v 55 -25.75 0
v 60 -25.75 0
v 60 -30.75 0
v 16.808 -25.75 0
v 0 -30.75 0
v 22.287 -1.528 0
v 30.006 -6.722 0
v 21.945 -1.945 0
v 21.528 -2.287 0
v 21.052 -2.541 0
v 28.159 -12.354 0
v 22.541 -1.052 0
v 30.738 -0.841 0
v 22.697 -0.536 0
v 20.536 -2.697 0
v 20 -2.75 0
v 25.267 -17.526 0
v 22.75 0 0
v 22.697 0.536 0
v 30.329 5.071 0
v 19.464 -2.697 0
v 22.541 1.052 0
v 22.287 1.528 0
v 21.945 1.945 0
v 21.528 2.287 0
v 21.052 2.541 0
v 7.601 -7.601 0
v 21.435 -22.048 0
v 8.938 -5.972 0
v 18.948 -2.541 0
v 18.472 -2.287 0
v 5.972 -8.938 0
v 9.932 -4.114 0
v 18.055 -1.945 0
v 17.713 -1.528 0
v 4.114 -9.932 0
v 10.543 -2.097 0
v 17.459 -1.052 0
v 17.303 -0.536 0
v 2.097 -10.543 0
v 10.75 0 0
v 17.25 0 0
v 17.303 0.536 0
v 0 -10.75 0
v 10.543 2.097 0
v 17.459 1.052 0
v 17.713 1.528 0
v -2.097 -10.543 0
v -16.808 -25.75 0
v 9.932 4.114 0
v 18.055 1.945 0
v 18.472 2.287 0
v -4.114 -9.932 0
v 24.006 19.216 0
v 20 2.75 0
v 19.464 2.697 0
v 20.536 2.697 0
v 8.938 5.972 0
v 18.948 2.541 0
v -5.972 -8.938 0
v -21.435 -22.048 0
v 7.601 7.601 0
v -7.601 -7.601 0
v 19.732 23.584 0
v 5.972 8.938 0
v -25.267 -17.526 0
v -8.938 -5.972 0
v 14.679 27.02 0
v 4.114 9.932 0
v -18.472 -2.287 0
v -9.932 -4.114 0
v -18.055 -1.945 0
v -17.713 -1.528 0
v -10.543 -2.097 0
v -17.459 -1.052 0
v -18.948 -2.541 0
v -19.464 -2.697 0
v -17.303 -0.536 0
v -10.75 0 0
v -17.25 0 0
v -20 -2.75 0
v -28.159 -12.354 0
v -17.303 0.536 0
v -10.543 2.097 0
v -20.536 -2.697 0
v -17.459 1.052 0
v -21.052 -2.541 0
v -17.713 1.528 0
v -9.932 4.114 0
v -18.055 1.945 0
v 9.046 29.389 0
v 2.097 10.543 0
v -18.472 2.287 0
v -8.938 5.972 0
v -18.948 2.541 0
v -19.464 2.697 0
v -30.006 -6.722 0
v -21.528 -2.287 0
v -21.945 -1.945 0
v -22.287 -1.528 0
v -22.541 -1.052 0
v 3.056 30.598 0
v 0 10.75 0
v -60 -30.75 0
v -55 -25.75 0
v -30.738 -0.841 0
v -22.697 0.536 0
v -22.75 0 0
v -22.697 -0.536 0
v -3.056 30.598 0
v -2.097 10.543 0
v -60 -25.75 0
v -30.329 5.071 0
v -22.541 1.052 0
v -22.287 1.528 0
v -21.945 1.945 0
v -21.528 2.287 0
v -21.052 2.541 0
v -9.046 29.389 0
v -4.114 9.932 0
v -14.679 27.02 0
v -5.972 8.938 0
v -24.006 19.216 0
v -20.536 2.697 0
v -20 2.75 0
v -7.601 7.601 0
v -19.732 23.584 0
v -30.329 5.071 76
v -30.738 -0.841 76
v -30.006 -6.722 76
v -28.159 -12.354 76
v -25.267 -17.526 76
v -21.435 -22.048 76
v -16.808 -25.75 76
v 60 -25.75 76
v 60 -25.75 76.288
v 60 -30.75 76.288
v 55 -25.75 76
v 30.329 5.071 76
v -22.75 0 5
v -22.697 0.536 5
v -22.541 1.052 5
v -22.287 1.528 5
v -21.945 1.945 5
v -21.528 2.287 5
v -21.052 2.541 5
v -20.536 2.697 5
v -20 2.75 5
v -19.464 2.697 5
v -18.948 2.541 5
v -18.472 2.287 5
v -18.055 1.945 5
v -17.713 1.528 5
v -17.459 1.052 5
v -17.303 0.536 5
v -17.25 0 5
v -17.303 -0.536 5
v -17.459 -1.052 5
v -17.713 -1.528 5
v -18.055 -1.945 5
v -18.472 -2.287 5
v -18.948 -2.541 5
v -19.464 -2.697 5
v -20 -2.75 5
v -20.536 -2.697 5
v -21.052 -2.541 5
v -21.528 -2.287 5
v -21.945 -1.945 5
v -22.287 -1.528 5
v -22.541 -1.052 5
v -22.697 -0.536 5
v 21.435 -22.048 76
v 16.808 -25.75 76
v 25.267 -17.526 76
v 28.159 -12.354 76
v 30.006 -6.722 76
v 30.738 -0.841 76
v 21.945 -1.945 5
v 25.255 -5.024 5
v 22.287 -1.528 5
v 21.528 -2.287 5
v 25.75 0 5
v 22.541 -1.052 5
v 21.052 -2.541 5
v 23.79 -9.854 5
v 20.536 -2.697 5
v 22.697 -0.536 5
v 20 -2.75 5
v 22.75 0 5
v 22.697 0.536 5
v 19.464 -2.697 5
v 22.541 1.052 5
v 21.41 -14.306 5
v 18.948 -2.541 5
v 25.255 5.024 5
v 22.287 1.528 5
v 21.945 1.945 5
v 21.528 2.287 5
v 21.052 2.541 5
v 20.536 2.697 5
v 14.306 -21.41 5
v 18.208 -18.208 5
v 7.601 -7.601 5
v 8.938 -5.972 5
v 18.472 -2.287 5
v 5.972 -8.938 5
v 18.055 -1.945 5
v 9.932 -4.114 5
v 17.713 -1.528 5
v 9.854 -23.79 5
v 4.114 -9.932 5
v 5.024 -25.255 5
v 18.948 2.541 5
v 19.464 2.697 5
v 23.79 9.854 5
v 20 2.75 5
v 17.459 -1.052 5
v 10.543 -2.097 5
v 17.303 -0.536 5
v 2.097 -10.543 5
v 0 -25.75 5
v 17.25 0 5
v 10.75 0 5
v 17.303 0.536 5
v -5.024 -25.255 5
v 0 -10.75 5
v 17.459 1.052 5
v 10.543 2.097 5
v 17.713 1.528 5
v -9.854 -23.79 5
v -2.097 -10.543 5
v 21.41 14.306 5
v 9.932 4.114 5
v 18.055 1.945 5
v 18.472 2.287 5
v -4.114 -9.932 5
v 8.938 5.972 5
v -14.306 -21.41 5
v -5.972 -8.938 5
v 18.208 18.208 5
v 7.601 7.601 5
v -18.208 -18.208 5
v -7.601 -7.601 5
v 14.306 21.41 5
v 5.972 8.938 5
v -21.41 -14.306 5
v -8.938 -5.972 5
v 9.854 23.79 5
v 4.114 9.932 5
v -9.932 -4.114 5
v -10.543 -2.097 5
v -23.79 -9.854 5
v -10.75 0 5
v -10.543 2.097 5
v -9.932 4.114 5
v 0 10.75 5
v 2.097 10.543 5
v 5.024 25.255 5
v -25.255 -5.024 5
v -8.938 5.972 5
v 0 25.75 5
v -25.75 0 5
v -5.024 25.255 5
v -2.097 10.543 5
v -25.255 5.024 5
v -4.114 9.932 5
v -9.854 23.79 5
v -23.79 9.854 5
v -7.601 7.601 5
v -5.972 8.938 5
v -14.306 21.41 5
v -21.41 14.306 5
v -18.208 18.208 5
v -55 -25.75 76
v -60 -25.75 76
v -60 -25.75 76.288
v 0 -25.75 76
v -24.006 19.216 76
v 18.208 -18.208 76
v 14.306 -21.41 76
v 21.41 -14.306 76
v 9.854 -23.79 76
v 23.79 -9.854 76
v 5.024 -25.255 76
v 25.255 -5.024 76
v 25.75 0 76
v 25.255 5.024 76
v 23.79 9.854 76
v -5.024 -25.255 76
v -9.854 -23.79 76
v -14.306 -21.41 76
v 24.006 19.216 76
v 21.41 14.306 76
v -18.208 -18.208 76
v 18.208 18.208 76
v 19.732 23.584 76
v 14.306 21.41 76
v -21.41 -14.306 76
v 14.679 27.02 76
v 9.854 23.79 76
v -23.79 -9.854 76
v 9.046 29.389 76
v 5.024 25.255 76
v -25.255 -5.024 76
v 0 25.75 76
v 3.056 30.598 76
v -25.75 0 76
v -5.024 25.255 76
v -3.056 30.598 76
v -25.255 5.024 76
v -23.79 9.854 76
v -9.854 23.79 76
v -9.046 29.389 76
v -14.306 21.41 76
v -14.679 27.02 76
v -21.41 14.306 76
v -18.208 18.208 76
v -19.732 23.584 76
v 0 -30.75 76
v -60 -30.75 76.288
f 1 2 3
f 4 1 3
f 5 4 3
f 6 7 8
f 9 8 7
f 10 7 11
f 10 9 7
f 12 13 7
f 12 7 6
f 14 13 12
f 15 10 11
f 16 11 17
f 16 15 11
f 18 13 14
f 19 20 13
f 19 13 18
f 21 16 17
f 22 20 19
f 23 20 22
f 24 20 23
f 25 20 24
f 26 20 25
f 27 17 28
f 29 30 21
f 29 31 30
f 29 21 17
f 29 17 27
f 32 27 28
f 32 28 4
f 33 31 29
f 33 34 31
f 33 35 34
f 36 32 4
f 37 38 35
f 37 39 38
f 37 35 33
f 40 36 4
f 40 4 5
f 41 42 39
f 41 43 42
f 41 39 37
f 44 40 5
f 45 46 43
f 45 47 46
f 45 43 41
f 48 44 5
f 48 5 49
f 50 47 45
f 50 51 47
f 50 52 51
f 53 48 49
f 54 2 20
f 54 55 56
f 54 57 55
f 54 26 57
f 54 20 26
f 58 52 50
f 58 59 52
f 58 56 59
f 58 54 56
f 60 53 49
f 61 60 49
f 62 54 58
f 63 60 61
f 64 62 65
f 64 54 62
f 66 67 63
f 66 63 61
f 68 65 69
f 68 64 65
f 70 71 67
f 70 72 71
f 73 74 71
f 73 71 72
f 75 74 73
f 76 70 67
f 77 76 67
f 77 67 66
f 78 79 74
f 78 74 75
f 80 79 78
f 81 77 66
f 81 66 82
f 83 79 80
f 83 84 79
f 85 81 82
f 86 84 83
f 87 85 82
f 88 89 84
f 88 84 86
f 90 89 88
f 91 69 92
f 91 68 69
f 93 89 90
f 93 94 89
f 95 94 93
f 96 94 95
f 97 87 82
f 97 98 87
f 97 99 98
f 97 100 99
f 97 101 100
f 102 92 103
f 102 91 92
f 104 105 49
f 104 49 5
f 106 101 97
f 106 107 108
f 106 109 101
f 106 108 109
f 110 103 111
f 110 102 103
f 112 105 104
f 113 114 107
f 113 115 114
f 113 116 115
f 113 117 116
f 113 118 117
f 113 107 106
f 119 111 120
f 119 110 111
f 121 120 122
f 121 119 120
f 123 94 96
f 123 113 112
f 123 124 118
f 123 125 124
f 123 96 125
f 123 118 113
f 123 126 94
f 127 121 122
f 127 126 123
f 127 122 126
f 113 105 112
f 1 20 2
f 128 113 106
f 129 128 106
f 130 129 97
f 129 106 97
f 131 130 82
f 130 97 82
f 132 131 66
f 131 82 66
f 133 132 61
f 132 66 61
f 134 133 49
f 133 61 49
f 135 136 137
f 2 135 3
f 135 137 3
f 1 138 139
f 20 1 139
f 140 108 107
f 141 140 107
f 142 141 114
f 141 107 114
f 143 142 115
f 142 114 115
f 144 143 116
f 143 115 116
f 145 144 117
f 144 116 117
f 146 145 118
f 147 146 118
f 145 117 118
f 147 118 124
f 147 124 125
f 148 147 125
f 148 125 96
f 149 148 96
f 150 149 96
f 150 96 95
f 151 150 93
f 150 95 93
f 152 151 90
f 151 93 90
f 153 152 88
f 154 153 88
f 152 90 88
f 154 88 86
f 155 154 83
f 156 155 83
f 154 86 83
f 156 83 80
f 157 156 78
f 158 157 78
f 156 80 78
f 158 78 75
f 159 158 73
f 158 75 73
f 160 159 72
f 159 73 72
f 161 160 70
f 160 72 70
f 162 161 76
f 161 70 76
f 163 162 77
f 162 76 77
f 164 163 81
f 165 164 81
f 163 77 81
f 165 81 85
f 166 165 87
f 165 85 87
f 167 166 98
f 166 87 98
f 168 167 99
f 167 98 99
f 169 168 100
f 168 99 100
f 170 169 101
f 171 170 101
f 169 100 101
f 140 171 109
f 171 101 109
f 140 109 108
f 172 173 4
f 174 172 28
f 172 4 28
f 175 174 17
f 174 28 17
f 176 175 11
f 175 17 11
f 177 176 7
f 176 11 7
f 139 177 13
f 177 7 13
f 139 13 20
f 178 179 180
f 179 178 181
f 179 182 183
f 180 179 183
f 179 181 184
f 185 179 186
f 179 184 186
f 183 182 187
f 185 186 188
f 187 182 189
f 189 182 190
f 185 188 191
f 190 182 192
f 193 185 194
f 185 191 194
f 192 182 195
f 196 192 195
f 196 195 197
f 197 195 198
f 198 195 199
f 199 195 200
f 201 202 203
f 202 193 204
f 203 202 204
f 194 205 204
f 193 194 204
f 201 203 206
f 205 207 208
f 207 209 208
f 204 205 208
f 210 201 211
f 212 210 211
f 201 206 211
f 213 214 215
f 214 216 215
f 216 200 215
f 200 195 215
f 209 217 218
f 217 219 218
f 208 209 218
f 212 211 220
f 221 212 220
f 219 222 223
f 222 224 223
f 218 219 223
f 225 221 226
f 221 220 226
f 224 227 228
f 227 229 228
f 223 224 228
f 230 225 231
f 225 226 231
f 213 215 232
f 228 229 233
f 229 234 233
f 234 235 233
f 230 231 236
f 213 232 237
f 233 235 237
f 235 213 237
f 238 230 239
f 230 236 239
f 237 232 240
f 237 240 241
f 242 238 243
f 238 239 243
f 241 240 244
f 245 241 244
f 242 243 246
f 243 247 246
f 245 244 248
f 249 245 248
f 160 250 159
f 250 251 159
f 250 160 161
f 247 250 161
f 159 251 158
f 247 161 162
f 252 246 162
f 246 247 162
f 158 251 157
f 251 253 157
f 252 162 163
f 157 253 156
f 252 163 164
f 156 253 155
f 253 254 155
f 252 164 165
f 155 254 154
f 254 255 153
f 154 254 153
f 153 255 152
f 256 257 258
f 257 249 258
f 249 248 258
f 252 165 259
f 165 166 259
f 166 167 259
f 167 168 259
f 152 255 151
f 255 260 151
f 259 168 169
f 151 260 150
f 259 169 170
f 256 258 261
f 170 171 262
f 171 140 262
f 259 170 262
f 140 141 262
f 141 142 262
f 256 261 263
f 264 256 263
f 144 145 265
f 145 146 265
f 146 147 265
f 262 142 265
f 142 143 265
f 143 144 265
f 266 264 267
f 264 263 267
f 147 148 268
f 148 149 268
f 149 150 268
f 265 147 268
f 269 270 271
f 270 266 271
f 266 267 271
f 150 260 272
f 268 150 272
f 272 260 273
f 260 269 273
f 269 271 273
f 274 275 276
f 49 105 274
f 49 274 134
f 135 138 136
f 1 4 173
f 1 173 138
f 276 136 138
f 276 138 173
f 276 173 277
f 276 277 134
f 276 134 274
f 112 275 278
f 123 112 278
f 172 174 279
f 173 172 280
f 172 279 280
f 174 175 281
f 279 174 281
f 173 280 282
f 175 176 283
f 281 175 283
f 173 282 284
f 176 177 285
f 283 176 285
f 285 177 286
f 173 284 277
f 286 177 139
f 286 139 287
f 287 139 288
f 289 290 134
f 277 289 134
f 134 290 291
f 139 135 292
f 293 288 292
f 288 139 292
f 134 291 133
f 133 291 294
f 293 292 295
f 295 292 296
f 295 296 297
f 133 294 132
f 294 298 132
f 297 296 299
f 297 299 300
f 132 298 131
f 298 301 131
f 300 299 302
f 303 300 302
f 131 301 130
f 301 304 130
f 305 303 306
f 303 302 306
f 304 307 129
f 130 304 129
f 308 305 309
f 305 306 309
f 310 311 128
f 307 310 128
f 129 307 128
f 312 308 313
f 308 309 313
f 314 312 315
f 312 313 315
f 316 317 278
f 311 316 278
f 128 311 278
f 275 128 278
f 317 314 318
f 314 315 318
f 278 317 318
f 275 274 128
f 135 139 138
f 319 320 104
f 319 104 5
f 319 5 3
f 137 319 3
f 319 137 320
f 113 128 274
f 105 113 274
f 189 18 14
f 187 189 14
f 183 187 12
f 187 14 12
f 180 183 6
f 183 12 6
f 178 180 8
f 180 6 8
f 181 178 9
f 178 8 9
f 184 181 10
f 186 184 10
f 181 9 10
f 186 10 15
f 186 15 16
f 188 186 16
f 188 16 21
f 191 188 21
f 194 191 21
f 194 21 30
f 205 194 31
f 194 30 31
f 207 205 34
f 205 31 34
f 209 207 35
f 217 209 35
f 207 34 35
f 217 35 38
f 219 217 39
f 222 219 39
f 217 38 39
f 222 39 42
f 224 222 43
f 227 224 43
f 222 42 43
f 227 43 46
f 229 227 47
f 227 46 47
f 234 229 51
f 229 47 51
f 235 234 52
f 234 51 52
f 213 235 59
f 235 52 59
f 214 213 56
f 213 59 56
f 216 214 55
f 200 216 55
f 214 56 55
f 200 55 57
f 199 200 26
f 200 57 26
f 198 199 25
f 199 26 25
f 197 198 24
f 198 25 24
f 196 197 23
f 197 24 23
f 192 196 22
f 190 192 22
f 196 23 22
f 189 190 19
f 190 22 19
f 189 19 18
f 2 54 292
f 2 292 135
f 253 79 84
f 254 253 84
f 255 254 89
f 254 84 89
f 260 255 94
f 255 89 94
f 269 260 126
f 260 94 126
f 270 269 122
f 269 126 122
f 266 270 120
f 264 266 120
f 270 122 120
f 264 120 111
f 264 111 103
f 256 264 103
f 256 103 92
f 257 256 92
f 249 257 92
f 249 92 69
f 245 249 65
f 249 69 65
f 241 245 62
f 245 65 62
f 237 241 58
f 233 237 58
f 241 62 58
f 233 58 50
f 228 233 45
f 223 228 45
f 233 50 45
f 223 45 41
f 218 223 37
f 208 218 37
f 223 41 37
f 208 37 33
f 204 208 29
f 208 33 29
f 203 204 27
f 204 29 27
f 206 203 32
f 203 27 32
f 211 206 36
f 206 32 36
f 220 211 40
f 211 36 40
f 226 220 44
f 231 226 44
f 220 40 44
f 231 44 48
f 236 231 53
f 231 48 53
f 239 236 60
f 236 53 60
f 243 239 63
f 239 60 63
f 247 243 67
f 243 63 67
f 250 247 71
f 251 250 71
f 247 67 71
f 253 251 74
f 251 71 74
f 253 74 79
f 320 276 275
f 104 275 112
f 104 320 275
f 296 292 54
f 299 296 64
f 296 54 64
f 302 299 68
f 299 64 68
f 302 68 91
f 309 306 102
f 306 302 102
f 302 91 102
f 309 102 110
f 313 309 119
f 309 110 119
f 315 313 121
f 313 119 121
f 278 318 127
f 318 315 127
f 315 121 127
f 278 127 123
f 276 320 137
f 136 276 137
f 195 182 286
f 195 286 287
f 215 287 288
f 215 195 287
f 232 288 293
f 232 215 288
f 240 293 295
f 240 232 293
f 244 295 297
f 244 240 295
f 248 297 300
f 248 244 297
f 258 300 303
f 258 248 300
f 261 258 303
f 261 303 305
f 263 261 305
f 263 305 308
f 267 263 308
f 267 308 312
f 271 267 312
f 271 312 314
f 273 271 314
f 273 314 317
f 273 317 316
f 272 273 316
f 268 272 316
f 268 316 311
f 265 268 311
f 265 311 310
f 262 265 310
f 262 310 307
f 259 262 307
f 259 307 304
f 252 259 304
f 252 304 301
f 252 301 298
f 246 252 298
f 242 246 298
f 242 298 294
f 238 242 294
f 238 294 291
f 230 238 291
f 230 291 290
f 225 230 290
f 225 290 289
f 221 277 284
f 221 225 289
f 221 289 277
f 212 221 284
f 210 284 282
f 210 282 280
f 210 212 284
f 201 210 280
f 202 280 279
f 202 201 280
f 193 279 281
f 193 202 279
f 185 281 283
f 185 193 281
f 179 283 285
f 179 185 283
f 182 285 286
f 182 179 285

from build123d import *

# Parameters (mm, degrees)
SKETCH1_R           = 30.75
SKETCH1_R_2         = 25.75
BOSS_EXTRUDE2_DEPTH = 76
SKETCH2_R           = 25.75
BOSS_EXTRUDE3_DEPTH = 5
SKETCH3_R           = 10.75
CUT_EXTRUDE1_DEPTH  = 5
SKETCH8_R           = 2.75
CUT_EXTRUDE3_DEPTH  = 5
SKETCH9_W           = 120
SKETCH9_H           = 76.288316085
BOSS_EXTRUDE4_DEPTH = 5
BOSS_EXTRUDE5_DEPTH = 76


with BuildPart() as part:
    # Sketch1 → Boss-Extrude2 (new body)
    with BuildSketch(Plane.XY):
        Circle(SKETCH1_R)
        Circle(SKETCH1_R_2, mode=Mode.SUBTRACT)
    extrude(amount=BOSS_EXTRUDE2_DEPTH)

    # Sketch2 → Boss-Extrude3 (add)
    with BuildSketch(Plane(origin=(0, 0, 0), x_dir=(-1, 0, 0), z_dir=(0, 0, -1))):
        Circle(SKETCH2_R)
    extrude(amount=-BOSS_EXTRUDE3_DEPTH)

    # Sketch3 → Cut-Extrude1 (cut)
    with BuildSketch(Plane(origin=(0, 0, 0), x_dir=(-1, 0, 0), z_dir=(0, 0, -1))):
        Circle(SKETCH3_R)
    extrude(amount=-CUT_EXTRUDE1_DEPTH, mode=Mode.SUBTRACT)

    # Sketch8 → Cut-Extrude3 (cut)
    with BuildSketch(Plane(origin=(0, 0, 0), x_dir=(-1, 0, 0), z_dir=(0, 0, -1))):
        with Locations((20, 0)):
            Circle(SKETCH8_R)
        with Locations(Location((-20, 0, 0), (0, 0, 180))):
            Circle(SKETCH8_R)
    extrude(amount=-CUT_EXTRUDE3_DEPTH, mode=Mode.SUBTRACT)

    # Sketch9 → Boss-Extrude4 (add)
    with BuildSketch(Plane(origin=(0, -30.75, 0), x_dir=(1, 0, 0), z_dir=(0, 1, 0))):
        with Locations((0, -38.144158043)):
            Rectangle(SKETCH9_W, SKETCH9_H)
    extrude(amount=BOSS_EXTRUDE4_DEPTH)

    # Sketch11 → Boss-Extrude5 (add, through all)
    with BuildSketch(Plane.XY.offset(76)):
        Polygon((-60, -25.75), (-24.006301312, 19.21613898), (-30.32899646, 5.070944065), (-55, -25.75), align=None)
        Polygon((55, -25.75), (30.32899646, 5.070944065), (24.006301312, 19.21613898), (60, -25.75), align=None)
    extrude(amount=-BOSS_EXTRUDE5_DEPTH)


solid = part.part
